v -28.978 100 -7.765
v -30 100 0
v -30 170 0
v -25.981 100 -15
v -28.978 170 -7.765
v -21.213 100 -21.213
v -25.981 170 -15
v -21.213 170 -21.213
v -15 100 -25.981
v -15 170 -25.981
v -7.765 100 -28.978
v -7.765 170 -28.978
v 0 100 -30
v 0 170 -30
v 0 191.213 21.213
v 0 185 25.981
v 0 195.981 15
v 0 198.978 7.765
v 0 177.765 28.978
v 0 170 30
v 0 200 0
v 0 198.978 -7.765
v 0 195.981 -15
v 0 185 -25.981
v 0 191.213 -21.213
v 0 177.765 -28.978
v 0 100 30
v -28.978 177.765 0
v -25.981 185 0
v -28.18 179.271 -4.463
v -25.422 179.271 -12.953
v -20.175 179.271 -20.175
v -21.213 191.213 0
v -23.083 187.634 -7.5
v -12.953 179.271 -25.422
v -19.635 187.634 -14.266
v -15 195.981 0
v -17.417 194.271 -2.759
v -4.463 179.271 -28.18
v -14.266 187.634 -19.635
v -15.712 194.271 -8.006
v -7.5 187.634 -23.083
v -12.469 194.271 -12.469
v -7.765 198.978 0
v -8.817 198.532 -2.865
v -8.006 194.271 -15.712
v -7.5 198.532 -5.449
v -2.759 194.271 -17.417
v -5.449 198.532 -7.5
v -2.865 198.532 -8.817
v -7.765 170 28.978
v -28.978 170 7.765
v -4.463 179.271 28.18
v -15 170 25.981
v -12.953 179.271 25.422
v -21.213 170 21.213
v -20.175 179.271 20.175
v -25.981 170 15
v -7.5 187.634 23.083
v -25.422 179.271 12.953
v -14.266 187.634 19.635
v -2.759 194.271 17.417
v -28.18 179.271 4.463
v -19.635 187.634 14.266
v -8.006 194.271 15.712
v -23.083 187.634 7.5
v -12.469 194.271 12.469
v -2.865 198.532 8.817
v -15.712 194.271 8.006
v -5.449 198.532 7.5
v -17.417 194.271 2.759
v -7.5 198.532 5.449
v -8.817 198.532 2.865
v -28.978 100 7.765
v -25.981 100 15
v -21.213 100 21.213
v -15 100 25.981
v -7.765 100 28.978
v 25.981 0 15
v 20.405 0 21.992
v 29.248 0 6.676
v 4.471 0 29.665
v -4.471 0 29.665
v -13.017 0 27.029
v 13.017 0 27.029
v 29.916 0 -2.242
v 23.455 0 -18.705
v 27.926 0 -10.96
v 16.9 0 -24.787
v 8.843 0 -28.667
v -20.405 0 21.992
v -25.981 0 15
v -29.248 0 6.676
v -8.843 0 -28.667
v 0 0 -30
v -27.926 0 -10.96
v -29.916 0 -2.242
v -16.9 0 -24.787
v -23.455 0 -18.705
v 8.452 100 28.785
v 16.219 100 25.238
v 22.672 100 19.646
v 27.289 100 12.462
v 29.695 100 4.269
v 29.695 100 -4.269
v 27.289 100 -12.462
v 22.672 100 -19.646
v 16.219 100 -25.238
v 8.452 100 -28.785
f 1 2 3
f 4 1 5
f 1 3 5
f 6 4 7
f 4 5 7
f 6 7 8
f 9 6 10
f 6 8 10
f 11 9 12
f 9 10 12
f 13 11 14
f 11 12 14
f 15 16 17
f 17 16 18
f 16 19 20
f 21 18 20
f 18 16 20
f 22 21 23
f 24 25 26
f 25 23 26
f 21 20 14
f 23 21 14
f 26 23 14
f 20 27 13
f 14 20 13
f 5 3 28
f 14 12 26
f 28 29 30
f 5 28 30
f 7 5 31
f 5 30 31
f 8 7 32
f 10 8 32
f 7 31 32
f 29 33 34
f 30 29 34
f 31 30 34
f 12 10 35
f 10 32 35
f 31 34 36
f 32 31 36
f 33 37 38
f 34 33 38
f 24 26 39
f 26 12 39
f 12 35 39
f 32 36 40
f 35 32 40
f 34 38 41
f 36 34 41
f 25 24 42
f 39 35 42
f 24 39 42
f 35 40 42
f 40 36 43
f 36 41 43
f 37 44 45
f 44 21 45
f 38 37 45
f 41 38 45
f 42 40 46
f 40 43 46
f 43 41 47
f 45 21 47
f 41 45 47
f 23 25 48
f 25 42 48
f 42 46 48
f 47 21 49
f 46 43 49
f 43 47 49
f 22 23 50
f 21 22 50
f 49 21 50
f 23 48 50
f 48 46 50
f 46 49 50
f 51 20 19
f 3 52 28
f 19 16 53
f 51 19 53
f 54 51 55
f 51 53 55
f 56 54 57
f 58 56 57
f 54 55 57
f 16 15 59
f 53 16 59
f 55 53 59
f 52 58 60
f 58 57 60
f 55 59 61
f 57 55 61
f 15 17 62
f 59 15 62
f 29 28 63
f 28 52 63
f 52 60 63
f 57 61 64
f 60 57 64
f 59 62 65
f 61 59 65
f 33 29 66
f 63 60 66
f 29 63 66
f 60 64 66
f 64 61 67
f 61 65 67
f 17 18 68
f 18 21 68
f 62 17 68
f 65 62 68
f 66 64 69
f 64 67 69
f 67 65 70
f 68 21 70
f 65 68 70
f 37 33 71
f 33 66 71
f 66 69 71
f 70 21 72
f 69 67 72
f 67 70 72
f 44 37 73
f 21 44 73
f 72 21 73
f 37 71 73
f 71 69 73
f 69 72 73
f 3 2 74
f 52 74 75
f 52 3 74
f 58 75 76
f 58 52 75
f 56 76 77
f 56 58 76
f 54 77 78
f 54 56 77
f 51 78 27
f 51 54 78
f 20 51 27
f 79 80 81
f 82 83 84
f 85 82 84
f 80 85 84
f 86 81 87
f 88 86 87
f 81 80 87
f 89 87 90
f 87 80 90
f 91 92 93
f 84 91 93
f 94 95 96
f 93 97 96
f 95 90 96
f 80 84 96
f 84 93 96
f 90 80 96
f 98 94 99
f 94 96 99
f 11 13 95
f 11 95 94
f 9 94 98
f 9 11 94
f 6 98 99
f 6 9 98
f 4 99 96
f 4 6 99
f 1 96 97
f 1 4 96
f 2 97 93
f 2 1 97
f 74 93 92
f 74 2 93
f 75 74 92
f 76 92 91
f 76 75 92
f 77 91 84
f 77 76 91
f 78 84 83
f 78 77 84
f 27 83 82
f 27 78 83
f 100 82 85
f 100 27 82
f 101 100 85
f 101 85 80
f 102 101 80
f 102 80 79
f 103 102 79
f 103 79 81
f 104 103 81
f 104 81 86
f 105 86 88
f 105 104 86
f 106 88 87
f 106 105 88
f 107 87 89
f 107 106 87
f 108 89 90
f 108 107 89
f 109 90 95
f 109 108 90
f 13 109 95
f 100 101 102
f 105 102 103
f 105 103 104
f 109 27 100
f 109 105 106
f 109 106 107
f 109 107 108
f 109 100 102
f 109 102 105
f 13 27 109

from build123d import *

# Parameters (mm, degrees)
SKETCH_1_W      = 30
SKETCH_1_H      = 100
SKETCH_2_W      = 30
SKETCH_2_H      = 60
EXTRUDE_1_DEPTH = 100
FILLET_1_R      = 30


with BuildPart() as part:
    # Эскиз1 → Повернуть1 (revolve)
    with BuildSketch(Plane.XY, mode=Mode.PRIVATE) as revolve_1_sk:
        with Locations((-15, 50)):
            Rectangle(SKETCH_1_W, SKETCH_1_H)
    revolve(revolve_1_sk.sketch.rotate(Axis((0, 0, 0), (0, 1, 0)), 270), axis=Axis((0, 0, 0), (0, 1, 0)))

    # Эскиз2 → Бобышка-Вытянуть1 (add)
    with BuildSketch(Plane(origin=(0, 100, 0), x_dir=(1, 0, 0), z_dir=(0, 1, 0))):
        with Locations((-15, 0)):
            Rectangle(SKETCH_2_W, SKETCH_2_H)
    extrude(amount=EXTRUDE_1_DEPTH)

    # Скругление1
    fillet_1_edges = [part.edges().sort_by_distance(p)[0] for p in [
        (-30, 150, -30),
    ]]
    fillet(fillet_1_edges, radius=FILLET_1_R - 0.0001)  # a hair under: the kernel refuses the full size
    fillet_1_2_edges = [part.edges().sort_by_distance(p)[0] for p in [
        (-30, 150, 30),
    ]]
    fillet(fillet_1_2_edges, radius=FILLET_1_R - 0.0001)  # a hair under: the kernel refuses the full size
    fillet_1_3_edges = [part.edges().sort_by_distance(p)[0] for p in [
        (-30, 200, 0),
    ]]
    fillet(fillet_1_3_edges, radius=FILLET_1_R - 0.0001)  # a hair under: the kernel refuses the full size


solid = part.part
